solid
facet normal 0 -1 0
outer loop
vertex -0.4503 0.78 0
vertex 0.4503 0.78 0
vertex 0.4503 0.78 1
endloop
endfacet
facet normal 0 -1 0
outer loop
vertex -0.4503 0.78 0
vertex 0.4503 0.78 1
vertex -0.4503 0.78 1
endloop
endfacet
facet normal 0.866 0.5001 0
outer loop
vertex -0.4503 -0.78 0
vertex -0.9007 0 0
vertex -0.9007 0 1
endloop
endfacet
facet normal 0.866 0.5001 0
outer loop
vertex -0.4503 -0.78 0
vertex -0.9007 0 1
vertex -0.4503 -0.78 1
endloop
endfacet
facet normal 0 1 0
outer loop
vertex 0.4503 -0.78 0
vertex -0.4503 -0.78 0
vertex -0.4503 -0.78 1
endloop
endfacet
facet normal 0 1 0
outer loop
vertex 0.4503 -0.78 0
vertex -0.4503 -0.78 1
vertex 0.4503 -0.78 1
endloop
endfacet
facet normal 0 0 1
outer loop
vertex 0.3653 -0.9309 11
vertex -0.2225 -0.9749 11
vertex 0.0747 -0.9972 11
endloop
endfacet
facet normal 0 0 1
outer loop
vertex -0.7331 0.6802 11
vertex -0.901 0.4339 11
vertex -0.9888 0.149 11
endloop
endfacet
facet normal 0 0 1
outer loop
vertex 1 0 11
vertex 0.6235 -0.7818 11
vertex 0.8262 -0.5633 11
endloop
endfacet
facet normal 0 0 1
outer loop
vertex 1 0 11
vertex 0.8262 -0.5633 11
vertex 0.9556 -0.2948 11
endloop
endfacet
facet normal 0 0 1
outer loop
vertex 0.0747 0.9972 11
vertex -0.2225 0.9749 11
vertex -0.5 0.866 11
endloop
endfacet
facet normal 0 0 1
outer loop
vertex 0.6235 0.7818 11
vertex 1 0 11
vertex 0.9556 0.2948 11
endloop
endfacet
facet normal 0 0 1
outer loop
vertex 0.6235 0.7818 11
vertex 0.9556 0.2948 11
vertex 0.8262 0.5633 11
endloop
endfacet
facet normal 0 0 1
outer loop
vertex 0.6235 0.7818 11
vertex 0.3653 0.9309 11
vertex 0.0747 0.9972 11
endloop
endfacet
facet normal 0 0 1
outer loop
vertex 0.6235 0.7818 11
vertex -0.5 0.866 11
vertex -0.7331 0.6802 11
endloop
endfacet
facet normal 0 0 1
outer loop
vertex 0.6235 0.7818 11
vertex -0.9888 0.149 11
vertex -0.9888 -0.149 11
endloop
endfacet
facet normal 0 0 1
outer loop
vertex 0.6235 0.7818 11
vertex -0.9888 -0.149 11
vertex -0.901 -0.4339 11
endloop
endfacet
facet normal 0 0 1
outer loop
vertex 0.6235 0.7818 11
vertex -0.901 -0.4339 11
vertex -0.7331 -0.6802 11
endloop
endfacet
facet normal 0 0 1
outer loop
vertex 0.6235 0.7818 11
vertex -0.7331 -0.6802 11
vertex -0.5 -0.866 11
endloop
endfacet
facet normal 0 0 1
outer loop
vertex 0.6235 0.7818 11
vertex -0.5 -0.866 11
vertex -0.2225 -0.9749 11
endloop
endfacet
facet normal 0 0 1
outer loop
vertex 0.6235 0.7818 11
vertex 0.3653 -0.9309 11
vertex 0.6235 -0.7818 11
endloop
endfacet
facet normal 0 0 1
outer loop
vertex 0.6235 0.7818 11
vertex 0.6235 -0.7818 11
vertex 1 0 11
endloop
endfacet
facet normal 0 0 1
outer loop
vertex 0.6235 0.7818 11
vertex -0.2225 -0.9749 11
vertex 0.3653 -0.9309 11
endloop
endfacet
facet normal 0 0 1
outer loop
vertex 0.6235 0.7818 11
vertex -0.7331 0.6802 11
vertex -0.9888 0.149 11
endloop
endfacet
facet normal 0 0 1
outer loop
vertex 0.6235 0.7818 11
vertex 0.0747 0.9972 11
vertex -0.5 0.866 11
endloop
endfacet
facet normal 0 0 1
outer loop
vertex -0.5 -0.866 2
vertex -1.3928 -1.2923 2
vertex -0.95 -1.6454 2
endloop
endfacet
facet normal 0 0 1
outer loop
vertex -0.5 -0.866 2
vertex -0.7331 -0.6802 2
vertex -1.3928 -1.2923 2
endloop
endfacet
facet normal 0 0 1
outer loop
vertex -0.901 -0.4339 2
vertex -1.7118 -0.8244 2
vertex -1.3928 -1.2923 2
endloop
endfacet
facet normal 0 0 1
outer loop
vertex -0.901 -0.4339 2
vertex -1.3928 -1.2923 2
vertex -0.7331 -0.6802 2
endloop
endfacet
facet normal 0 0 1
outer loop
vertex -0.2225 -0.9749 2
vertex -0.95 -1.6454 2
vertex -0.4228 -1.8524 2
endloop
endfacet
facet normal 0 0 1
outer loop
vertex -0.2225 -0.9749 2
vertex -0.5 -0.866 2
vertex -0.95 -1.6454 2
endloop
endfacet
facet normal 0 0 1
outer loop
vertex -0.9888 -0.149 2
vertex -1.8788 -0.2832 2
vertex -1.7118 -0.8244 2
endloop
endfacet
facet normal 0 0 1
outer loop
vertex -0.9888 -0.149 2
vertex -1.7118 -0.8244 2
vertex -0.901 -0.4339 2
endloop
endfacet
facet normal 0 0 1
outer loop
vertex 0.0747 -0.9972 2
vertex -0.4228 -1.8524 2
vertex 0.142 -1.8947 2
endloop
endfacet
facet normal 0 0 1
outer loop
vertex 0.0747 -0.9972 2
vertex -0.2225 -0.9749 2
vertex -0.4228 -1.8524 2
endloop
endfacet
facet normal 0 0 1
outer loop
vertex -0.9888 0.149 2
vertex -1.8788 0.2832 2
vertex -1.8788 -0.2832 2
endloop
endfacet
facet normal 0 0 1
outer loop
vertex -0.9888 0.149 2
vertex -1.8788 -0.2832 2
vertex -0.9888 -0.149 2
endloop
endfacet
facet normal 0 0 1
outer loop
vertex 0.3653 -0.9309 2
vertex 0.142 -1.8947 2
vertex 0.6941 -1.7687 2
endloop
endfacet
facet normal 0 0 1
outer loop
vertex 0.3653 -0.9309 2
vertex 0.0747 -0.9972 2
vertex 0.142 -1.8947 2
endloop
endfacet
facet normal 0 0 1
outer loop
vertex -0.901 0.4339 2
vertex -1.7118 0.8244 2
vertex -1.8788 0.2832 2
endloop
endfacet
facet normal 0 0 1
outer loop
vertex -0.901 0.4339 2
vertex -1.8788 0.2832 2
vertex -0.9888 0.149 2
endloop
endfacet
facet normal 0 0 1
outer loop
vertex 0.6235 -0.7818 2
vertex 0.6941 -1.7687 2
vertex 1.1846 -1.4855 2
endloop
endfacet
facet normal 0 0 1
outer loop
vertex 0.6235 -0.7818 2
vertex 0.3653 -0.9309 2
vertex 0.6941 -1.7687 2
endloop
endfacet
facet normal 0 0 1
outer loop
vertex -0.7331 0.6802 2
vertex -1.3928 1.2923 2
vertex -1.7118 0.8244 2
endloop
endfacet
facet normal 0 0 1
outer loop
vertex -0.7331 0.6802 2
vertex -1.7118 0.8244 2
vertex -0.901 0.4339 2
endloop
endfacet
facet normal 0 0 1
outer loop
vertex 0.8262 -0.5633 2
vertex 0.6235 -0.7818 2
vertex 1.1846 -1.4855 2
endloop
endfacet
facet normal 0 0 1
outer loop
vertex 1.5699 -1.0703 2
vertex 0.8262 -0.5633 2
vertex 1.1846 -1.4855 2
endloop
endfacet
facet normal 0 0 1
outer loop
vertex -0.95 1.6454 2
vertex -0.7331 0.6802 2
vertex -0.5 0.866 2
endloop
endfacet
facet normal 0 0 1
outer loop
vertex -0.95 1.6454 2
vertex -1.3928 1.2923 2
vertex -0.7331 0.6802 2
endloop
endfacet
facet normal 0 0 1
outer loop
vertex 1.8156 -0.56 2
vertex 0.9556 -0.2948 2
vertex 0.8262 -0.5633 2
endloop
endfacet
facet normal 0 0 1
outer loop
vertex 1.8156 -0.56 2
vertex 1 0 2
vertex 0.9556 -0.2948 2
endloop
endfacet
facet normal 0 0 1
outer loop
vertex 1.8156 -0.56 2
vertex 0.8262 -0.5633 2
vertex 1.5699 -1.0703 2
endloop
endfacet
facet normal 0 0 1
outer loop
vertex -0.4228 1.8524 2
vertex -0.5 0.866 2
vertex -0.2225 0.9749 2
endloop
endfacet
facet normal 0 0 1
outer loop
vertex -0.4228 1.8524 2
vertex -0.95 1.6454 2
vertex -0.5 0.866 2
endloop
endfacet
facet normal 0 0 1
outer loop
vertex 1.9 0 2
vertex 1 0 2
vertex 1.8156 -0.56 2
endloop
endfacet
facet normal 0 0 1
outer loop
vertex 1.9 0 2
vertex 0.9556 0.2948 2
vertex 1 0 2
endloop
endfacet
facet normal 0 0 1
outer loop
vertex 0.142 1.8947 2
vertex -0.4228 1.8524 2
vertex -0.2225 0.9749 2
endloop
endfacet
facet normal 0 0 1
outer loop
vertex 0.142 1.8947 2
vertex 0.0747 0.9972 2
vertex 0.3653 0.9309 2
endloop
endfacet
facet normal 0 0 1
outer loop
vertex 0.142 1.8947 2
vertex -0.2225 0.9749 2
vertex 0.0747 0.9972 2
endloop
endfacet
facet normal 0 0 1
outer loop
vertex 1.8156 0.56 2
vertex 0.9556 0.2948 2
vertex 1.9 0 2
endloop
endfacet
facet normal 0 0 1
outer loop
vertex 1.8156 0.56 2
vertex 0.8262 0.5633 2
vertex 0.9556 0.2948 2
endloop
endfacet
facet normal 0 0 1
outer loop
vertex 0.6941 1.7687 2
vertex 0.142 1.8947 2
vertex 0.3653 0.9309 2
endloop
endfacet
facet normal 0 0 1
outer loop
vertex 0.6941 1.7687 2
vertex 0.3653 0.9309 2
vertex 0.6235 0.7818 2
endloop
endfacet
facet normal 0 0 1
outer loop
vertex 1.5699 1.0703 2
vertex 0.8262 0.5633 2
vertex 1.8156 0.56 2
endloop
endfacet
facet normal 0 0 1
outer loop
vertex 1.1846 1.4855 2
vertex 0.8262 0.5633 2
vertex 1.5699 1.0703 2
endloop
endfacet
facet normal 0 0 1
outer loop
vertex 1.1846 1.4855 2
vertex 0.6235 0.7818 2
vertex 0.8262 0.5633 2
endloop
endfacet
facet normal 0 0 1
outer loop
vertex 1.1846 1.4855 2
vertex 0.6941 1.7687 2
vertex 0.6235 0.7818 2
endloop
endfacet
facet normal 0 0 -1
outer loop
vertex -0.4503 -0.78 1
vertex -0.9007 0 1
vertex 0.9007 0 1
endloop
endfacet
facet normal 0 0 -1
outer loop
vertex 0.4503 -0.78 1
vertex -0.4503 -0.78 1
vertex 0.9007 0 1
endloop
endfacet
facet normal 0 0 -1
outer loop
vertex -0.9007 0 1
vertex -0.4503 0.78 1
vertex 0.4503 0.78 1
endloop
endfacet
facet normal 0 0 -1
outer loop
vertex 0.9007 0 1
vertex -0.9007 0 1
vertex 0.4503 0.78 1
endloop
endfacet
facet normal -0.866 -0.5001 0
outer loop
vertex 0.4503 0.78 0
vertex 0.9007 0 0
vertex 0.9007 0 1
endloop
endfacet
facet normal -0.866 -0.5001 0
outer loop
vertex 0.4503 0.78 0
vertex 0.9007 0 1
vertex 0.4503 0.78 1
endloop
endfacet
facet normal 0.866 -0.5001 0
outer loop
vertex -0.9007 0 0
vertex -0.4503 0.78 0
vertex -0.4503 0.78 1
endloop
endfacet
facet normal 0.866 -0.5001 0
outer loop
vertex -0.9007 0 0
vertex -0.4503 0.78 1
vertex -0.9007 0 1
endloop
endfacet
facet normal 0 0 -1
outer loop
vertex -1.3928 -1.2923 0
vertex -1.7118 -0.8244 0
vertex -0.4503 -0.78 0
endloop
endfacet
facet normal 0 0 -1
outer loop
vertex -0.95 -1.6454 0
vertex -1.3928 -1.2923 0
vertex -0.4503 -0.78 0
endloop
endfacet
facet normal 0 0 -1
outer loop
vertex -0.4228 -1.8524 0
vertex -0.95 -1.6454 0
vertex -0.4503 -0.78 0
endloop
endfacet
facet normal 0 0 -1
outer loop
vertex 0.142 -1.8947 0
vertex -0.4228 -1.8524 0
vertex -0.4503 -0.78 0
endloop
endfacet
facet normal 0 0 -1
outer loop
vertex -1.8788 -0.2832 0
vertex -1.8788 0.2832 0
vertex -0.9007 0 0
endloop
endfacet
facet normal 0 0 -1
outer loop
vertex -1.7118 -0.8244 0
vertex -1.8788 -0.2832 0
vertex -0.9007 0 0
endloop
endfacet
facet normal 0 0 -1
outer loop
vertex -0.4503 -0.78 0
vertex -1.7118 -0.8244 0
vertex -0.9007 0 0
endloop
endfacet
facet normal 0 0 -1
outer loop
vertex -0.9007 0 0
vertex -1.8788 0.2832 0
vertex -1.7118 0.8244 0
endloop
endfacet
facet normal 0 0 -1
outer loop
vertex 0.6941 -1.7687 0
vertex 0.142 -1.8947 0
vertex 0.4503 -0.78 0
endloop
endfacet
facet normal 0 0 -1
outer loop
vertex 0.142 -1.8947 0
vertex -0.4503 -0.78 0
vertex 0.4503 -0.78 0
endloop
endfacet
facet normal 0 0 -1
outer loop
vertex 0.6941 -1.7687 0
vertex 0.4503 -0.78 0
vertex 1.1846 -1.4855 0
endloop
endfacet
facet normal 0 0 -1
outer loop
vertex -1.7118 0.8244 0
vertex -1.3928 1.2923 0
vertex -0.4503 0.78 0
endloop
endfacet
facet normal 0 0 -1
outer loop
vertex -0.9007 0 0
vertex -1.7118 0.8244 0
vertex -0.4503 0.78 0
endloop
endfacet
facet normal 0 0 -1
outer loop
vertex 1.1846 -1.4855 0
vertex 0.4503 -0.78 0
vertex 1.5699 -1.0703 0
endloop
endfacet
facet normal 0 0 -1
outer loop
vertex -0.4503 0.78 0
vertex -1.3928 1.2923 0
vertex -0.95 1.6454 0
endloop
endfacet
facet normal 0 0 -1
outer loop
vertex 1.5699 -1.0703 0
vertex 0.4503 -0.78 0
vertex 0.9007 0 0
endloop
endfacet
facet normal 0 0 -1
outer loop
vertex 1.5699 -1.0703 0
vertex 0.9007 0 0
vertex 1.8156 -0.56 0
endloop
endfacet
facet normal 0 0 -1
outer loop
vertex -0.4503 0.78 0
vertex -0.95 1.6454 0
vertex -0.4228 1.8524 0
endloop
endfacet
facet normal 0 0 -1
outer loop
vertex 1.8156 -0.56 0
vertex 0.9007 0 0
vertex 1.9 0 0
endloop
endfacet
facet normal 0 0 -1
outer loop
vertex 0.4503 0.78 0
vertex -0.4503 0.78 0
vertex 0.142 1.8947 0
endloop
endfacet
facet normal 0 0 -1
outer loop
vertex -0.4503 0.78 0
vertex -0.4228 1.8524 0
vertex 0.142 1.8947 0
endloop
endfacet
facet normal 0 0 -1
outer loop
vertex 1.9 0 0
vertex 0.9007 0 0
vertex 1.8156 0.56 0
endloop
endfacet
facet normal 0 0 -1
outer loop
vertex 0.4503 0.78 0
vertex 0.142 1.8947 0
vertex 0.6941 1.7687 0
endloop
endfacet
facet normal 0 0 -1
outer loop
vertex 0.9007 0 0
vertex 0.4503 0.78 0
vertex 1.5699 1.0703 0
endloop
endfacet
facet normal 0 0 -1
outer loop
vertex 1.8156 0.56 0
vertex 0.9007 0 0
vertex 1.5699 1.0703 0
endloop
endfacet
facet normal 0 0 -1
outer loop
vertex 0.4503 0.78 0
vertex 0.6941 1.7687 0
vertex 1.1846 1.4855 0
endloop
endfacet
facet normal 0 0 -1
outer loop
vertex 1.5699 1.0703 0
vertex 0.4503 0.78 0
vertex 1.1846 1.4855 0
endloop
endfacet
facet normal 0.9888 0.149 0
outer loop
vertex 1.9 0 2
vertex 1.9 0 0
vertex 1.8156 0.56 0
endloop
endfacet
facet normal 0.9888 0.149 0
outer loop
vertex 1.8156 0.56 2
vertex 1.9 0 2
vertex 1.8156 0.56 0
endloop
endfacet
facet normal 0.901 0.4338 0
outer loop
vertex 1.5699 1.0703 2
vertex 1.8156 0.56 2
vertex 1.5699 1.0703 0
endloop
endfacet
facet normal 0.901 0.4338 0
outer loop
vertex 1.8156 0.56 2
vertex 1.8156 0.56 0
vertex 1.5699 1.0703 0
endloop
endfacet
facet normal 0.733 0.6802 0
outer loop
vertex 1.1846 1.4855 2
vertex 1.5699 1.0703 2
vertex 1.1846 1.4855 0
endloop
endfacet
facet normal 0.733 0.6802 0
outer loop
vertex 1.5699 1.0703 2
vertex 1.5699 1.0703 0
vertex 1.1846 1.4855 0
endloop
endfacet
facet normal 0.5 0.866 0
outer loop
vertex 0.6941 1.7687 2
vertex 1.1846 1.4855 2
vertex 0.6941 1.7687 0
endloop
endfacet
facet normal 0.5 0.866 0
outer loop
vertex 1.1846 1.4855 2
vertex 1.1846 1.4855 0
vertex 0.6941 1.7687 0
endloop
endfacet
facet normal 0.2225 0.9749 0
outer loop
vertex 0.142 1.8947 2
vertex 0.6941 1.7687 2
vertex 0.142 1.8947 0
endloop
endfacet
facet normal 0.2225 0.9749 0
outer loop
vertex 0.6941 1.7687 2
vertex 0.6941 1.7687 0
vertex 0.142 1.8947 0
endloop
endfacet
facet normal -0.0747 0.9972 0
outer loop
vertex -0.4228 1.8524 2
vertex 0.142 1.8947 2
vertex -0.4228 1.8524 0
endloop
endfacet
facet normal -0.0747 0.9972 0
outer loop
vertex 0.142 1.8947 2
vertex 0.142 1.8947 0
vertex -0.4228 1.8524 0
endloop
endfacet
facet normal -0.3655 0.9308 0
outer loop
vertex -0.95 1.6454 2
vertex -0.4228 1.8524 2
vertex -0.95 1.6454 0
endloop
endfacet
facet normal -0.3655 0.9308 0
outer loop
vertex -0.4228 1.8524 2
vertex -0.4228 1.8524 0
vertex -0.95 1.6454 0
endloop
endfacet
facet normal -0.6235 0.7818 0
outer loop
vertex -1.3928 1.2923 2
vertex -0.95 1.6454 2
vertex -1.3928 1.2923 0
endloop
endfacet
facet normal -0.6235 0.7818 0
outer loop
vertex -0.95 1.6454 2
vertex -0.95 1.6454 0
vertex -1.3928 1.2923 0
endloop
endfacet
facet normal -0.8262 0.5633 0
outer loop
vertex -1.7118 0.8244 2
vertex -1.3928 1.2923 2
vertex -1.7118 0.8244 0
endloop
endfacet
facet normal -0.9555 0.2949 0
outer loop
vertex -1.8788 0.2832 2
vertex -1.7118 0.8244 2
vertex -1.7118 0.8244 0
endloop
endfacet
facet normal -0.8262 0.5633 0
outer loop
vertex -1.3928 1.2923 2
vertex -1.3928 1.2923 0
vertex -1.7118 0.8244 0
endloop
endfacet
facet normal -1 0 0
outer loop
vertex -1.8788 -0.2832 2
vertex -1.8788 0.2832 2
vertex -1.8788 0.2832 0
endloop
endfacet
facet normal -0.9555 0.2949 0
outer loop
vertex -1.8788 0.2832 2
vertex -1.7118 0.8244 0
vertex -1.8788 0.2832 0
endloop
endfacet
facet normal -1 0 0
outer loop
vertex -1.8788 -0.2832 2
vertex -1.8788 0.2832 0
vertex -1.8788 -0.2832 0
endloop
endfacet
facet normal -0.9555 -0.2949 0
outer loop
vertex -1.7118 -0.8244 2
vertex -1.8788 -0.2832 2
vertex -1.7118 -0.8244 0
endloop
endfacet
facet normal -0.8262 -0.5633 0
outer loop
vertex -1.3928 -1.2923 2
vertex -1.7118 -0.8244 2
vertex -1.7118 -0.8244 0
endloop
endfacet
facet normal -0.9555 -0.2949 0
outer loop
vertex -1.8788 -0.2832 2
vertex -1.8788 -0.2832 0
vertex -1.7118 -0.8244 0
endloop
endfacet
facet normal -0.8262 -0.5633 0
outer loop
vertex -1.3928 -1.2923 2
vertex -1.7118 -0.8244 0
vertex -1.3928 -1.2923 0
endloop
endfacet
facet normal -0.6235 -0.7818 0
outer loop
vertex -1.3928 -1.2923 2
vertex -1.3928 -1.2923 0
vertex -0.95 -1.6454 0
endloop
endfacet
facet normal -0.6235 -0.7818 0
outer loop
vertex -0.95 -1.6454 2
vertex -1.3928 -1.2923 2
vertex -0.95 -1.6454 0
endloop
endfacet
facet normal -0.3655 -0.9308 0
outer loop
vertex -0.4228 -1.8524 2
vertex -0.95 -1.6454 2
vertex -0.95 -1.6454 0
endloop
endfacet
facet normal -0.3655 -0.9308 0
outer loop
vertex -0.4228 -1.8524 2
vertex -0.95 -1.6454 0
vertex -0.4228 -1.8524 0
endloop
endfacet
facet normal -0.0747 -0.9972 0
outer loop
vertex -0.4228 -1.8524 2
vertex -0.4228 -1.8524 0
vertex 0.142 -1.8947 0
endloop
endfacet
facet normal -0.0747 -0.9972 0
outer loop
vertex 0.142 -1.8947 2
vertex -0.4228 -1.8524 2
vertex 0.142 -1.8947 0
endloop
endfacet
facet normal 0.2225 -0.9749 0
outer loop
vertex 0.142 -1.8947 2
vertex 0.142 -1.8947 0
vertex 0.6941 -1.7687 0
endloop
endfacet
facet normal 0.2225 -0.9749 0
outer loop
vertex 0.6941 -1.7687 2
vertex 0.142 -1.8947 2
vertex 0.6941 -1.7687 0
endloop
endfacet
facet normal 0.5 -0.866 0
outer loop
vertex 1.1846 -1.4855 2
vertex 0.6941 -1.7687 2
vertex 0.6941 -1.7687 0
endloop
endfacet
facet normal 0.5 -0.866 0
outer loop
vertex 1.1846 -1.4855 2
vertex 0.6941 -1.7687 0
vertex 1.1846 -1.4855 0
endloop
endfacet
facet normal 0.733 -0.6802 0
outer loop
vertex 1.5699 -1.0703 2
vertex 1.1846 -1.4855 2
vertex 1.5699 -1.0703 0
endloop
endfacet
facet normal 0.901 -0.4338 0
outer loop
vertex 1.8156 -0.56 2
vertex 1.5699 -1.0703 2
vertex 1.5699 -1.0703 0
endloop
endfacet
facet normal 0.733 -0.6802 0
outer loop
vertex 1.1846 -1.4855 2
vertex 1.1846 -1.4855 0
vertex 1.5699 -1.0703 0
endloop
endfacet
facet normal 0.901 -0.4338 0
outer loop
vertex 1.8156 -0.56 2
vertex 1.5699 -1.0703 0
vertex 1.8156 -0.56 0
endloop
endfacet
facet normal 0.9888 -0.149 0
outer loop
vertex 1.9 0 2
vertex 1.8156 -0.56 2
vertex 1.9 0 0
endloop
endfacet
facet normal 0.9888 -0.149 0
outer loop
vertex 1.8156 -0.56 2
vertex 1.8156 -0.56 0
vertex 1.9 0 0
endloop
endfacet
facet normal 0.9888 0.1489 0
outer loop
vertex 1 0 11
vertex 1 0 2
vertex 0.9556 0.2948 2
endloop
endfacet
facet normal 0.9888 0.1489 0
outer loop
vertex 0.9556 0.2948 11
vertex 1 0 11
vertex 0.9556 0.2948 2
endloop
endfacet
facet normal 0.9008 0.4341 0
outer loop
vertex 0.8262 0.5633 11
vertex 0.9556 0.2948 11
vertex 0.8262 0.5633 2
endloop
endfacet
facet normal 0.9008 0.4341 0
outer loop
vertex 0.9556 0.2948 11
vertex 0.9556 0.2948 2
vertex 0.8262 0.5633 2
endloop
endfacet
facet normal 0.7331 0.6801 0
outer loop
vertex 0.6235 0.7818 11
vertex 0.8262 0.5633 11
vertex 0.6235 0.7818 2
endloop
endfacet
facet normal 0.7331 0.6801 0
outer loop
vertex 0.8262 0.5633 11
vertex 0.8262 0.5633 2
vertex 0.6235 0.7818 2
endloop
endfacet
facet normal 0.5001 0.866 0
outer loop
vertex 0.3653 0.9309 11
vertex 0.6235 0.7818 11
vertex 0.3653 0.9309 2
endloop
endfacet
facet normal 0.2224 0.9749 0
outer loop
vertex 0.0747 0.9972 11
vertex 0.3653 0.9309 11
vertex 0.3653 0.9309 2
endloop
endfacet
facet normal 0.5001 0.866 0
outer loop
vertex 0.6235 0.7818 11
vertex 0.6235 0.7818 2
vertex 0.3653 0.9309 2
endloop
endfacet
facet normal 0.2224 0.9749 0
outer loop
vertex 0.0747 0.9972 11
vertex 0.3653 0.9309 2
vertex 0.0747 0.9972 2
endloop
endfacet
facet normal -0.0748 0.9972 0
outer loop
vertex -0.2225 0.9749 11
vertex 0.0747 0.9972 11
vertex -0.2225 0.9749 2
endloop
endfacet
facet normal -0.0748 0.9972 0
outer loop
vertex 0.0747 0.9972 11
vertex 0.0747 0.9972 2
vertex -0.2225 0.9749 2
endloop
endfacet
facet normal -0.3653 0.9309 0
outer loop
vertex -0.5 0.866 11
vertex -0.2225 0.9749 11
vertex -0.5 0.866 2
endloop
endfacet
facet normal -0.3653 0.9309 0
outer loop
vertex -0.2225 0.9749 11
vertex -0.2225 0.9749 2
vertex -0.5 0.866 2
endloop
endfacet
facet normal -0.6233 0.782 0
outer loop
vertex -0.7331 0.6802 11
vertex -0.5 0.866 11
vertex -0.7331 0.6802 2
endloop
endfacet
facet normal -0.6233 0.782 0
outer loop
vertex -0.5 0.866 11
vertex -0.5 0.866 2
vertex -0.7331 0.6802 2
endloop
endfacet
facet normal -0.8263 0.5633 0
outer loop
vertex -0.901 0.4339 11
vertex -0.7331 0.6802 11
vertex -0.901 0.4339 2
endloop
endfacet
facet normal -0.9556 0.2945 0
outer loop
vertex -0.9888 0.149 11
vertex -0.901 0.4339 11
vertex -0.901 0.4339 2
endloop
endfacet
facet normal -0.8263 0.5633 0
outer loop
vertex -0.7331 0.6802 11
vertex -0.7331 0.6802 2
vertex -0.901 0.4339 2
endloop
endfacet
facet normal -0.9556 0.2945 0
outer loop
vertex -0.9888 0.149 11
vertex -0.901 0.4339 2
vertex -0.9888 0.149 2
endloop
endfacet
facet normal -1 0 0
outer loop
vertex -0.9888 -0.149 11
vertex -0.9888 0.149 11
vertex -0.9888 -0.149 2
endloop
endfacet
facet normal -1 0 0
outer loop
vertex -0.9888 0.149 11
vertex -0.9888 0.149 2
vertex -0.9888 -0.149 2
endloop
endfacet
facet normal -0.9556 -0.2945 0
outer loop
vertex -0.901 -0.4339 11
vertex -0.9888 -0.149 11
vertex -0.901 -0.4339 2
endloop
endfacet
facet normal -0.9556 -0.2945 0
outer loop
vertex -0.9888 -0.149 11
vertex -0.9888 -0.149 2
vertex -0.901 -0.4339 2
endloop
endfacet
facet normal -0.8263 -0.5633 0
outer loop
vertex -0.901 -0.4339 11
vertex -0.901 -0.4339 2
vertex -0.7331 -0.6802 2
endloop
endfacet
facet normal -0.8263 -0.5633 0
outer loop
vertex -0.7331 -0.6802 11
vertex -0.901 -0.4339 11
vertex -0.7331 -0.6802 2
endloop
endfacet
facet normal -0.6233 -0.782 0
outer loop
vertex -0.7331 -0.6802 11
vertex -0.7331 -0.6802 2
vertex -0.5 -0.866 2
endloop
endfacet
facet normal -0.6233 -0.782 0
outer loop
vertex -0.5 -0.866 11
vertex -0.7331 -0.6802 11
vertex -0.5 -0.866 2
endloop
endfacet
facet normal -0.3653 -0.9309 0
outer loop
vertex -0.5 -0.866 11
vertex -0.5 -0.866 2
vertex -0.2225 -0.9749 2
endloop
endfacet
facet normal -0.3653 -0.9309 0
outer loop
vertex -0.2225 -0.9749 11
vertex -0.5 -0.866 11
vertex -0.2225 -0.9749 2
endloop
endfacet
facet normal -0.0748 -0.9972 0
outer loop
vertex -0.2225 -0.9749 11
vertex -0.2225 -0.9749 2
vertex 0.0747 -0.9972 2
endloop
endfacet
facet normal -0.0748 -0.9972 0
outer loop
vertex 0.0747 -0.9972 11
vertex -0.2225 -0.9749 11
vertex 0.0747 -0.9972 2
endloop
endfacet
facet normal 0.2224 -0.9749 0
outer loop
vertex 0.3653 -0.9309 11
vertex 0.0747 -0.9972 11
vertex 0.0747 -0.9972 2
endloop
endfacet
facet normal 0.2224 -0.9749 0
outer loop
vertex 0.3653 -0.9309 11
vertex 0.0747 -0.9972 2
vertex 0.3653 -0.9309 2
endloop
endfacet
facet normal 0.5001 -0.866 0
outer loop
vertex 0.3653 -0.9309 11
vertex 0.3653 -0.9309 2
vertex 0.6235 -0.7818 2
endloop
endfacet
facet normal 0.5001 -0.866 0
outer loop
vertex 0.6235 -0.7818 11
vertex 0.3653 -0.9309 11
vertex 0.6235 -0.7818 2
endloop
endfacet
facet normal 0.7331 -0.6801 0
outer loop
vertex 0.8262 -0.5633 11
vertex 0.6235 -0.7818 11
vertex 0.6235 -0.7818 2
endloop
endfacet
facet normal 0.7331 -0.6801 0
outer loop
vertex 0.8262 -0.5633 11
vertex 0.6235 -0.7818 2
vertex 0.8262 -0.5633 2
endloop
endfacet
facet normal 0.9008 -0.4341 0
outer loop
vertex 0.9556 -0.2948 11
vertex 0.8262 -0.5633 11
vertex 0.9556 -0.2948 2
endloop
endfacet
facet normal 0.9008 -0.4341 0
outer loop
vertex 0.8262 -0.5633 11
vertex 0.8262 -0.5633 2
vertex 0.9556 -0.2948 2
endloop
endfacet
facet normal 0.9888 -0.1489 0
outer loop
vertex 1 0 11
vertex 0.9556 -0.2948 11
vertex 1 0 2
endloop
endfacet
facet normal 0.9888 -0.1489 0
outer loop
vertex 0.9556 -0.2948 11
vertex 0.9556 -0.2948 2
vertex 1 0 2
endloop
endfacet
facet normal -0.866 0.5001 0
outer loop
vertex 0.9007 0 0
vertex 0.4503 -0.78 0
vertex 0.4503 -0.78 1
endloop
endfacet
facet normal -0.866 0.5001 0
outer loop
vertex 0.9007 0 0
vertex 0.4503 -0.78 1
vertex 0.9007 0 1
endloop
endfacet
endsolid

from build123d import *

# Parameters (mm, degrees)
F0_R     = 1.9
F1_DEPTH = 2
F2_DEPTH = 1
F3_R     = 1
F4_DEPTH = 9


with BuildPart() as f1:
    # F0 (on Top) → F1 (new body)
    with BuildSketch(Plane.XY):
        Circle(F0_R)
        Polygon((-0.9006664199, 0), (-0.45033321, 0.78), (0.45033321, 0.78), (0.9006664199, 0), (0.45033321, -0.78), (-0.45033321, -0.78), align=None, mode=Mode.SUBTRACT)
        Polygon((0.45033321, 0.78), (-0.45033321, 0.78), (-0.9006664199, 0), (-0.45033321, -0.78), (0.45033321, -0.78), (0.9006664199, 0), align=None)
    extrude(amount=F1_DEPTH)

    # F0 (on Top) → F2 (cut)
    with BuildSketch(Plane.XY):
        Polygon((0.45033321, 0.78), (-0.45033321, 0.78), (-0.9006664199, 0), (-0.45033321, -0.78), (0.45033321, -0.78), (0.9006664199, 0), align=None)
    extrude(amount=F2_DEPTH, mode=Mode.SUBTRACT)

    # F3 (on face) → F4 (join)
    with BuildSketch(Plane.XY.offset(2)):
        Circle(F3_R)
    extrude(amount=F4_DEPTH)


solid = f1.part
